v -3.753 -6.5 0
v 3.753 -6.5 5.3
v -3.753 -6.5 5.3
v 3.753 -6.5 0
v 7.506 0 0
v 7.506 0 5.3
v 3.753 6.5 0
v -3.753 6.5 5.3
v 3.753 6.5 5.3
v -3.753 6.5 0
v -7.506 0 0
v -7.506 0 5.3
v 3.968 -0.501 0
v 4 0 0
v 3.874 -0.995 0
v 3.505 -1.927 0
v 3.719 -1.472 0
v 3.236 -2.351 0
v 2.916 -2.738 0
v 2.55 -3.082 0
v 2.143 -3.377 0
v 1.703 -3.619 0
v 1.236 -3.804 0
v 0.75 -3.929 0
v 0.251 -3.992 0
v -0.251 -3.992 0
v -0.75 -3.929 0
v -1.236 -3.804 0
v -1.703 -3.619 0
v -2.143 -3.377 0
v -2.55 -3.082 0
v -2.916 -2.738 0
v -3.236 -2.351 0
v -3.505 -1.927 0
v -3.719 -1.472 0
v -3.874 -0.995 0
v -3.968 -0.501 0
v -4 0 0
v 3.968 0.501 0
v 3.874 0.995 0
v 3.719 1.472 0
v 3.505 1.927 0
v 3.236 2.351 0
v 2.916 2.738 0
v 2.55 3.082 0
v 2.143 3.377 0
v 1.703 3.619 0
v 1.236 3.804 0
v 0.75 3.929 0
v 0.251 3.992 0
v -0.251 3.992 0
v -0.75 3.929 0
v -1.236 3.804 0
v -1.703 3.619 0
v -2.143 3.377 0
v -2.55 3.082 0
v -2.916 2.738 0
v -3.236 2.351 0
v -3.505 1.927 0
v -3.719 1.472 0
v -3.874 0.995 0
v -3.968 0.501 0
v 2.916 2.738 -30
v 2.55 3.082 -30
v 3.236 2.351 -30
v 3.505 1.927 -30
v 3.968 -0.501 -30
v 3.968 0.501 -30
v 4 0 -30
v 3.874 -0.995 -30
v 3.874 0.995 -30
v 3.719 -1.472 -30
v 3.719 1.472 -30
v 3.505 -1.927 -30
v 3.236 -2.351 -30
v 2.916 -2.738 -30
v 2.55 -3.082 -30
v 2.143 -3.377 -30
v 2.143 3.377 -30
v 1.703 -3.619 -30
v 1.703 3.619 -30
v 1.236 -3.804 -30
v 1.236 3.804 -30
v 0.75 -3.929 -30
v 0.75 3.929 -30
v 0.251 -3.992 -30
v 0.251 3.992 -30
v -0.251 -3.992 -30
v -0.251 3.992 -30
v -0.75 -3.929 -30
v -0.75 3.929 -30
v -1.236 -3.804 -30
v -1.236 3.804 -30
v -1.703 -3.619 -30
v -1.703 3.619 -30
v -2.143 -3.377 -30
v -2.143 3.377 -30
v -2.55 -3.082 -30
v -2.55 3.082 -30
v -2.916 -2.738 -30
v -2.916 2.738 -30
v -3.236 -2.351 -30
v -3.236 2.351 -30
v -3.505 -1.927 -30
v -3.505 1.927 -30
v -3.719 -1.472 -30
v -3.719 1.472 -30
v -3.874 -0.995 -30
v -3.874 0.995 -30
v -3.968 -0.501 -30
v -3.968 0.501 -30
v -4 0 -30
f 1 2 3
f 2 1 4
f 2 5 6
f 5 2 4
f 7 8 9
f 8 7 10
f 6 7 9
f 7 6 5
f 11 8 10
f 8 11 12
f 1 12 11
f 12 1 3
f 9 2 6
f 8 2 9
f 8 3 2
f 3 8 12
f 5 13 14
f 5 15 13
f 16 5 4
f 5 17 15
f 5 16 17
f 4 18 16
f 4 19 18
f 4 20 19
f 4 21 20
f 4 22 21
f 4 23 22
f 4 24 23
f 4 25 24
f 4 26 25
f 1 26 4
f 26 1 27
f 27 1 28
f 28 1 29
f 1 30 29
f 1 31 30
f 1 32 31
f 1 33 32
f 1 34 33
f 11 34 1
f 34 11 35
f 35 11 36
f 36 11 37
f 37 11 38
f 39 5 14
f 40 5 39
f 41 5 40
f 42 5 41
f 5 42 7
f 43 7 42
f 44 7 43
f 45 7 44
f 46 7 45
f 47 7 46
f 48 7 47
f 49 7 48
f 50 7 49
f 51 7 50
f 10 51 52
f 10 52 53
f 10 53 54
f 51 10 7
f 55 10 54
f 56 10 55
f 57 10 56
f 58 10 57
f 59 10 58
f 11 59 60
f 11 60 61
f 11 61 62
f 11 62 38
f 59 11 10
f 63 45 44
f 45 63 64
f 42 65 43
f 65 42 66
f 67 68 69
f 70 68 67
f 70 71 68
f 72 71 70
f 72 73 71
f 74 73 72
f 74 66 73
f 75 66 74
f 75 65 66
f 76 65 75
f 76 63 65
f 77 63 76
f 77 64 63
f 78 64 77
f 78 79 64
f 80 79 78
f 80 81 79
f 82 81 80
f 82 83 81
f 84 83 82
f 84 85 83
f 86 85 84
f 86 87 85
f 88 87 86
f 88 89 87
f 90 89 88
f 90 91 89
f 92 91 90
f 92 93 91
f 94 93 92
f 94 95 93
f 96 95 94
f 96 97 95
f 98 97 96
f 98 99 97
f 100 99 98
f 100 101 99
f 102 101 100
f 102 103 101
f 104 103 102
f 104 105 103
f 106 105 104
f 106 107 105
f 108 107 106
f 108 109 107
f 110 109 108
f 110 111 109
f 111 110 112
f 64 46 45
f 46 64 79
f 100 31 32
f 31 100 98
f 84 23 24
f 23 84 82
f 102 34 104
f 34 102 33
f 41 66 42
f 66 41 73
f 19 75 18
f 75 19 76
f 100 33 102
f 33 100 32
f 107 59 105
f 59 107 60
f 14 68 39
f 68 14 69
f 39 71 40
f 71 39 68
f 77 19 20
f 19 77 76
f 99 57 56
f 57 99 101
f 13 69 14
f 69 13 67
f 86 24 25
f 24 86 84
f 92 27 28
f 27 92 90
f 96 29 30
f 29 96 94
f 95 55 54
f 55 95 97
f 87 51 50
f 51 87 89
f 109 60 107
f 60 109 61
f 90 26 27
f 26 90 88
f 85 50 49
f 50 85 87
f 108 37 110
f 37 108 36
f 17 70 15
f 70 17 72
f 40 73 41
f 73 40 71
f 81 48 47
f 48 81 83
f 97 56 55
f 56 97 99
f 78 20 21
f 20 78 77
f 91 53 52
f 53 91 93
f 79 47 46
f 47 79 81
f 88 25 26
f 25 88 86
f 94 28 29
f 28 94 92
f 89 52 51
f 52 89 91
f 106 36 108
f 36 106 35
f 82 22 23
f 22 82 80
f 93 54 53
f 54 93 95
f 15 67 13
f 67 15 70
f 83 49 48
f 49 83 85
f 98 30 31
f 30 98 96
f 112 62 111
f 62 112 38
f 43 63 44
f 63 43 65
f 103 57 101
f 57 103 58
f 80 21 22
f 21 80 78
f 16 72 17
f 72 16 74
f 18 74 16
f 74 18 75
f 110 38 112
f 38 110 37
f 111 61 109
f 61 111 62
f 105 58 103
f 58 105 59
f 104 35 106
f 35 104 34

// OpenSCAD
// M8 六角ボルト

// パラメータ
head_across_flats = 13;  // 対辺距離
head_height = 5.3;        // 頭部の高さ
shank_diameter = 8;       // シャンク直径
shank_length = 30;        // シャンク長さ

// 六角柱の頭部
translate([0, 0, 0])
    cylinder(d = head_across_flats / cos(30), h = head_height, $fn = 6);

// シャンク（円柱）
translate([0, 0, -shank_length])
    cylinder(d = shank_diameter, h = shank_length, $fn = 50);
